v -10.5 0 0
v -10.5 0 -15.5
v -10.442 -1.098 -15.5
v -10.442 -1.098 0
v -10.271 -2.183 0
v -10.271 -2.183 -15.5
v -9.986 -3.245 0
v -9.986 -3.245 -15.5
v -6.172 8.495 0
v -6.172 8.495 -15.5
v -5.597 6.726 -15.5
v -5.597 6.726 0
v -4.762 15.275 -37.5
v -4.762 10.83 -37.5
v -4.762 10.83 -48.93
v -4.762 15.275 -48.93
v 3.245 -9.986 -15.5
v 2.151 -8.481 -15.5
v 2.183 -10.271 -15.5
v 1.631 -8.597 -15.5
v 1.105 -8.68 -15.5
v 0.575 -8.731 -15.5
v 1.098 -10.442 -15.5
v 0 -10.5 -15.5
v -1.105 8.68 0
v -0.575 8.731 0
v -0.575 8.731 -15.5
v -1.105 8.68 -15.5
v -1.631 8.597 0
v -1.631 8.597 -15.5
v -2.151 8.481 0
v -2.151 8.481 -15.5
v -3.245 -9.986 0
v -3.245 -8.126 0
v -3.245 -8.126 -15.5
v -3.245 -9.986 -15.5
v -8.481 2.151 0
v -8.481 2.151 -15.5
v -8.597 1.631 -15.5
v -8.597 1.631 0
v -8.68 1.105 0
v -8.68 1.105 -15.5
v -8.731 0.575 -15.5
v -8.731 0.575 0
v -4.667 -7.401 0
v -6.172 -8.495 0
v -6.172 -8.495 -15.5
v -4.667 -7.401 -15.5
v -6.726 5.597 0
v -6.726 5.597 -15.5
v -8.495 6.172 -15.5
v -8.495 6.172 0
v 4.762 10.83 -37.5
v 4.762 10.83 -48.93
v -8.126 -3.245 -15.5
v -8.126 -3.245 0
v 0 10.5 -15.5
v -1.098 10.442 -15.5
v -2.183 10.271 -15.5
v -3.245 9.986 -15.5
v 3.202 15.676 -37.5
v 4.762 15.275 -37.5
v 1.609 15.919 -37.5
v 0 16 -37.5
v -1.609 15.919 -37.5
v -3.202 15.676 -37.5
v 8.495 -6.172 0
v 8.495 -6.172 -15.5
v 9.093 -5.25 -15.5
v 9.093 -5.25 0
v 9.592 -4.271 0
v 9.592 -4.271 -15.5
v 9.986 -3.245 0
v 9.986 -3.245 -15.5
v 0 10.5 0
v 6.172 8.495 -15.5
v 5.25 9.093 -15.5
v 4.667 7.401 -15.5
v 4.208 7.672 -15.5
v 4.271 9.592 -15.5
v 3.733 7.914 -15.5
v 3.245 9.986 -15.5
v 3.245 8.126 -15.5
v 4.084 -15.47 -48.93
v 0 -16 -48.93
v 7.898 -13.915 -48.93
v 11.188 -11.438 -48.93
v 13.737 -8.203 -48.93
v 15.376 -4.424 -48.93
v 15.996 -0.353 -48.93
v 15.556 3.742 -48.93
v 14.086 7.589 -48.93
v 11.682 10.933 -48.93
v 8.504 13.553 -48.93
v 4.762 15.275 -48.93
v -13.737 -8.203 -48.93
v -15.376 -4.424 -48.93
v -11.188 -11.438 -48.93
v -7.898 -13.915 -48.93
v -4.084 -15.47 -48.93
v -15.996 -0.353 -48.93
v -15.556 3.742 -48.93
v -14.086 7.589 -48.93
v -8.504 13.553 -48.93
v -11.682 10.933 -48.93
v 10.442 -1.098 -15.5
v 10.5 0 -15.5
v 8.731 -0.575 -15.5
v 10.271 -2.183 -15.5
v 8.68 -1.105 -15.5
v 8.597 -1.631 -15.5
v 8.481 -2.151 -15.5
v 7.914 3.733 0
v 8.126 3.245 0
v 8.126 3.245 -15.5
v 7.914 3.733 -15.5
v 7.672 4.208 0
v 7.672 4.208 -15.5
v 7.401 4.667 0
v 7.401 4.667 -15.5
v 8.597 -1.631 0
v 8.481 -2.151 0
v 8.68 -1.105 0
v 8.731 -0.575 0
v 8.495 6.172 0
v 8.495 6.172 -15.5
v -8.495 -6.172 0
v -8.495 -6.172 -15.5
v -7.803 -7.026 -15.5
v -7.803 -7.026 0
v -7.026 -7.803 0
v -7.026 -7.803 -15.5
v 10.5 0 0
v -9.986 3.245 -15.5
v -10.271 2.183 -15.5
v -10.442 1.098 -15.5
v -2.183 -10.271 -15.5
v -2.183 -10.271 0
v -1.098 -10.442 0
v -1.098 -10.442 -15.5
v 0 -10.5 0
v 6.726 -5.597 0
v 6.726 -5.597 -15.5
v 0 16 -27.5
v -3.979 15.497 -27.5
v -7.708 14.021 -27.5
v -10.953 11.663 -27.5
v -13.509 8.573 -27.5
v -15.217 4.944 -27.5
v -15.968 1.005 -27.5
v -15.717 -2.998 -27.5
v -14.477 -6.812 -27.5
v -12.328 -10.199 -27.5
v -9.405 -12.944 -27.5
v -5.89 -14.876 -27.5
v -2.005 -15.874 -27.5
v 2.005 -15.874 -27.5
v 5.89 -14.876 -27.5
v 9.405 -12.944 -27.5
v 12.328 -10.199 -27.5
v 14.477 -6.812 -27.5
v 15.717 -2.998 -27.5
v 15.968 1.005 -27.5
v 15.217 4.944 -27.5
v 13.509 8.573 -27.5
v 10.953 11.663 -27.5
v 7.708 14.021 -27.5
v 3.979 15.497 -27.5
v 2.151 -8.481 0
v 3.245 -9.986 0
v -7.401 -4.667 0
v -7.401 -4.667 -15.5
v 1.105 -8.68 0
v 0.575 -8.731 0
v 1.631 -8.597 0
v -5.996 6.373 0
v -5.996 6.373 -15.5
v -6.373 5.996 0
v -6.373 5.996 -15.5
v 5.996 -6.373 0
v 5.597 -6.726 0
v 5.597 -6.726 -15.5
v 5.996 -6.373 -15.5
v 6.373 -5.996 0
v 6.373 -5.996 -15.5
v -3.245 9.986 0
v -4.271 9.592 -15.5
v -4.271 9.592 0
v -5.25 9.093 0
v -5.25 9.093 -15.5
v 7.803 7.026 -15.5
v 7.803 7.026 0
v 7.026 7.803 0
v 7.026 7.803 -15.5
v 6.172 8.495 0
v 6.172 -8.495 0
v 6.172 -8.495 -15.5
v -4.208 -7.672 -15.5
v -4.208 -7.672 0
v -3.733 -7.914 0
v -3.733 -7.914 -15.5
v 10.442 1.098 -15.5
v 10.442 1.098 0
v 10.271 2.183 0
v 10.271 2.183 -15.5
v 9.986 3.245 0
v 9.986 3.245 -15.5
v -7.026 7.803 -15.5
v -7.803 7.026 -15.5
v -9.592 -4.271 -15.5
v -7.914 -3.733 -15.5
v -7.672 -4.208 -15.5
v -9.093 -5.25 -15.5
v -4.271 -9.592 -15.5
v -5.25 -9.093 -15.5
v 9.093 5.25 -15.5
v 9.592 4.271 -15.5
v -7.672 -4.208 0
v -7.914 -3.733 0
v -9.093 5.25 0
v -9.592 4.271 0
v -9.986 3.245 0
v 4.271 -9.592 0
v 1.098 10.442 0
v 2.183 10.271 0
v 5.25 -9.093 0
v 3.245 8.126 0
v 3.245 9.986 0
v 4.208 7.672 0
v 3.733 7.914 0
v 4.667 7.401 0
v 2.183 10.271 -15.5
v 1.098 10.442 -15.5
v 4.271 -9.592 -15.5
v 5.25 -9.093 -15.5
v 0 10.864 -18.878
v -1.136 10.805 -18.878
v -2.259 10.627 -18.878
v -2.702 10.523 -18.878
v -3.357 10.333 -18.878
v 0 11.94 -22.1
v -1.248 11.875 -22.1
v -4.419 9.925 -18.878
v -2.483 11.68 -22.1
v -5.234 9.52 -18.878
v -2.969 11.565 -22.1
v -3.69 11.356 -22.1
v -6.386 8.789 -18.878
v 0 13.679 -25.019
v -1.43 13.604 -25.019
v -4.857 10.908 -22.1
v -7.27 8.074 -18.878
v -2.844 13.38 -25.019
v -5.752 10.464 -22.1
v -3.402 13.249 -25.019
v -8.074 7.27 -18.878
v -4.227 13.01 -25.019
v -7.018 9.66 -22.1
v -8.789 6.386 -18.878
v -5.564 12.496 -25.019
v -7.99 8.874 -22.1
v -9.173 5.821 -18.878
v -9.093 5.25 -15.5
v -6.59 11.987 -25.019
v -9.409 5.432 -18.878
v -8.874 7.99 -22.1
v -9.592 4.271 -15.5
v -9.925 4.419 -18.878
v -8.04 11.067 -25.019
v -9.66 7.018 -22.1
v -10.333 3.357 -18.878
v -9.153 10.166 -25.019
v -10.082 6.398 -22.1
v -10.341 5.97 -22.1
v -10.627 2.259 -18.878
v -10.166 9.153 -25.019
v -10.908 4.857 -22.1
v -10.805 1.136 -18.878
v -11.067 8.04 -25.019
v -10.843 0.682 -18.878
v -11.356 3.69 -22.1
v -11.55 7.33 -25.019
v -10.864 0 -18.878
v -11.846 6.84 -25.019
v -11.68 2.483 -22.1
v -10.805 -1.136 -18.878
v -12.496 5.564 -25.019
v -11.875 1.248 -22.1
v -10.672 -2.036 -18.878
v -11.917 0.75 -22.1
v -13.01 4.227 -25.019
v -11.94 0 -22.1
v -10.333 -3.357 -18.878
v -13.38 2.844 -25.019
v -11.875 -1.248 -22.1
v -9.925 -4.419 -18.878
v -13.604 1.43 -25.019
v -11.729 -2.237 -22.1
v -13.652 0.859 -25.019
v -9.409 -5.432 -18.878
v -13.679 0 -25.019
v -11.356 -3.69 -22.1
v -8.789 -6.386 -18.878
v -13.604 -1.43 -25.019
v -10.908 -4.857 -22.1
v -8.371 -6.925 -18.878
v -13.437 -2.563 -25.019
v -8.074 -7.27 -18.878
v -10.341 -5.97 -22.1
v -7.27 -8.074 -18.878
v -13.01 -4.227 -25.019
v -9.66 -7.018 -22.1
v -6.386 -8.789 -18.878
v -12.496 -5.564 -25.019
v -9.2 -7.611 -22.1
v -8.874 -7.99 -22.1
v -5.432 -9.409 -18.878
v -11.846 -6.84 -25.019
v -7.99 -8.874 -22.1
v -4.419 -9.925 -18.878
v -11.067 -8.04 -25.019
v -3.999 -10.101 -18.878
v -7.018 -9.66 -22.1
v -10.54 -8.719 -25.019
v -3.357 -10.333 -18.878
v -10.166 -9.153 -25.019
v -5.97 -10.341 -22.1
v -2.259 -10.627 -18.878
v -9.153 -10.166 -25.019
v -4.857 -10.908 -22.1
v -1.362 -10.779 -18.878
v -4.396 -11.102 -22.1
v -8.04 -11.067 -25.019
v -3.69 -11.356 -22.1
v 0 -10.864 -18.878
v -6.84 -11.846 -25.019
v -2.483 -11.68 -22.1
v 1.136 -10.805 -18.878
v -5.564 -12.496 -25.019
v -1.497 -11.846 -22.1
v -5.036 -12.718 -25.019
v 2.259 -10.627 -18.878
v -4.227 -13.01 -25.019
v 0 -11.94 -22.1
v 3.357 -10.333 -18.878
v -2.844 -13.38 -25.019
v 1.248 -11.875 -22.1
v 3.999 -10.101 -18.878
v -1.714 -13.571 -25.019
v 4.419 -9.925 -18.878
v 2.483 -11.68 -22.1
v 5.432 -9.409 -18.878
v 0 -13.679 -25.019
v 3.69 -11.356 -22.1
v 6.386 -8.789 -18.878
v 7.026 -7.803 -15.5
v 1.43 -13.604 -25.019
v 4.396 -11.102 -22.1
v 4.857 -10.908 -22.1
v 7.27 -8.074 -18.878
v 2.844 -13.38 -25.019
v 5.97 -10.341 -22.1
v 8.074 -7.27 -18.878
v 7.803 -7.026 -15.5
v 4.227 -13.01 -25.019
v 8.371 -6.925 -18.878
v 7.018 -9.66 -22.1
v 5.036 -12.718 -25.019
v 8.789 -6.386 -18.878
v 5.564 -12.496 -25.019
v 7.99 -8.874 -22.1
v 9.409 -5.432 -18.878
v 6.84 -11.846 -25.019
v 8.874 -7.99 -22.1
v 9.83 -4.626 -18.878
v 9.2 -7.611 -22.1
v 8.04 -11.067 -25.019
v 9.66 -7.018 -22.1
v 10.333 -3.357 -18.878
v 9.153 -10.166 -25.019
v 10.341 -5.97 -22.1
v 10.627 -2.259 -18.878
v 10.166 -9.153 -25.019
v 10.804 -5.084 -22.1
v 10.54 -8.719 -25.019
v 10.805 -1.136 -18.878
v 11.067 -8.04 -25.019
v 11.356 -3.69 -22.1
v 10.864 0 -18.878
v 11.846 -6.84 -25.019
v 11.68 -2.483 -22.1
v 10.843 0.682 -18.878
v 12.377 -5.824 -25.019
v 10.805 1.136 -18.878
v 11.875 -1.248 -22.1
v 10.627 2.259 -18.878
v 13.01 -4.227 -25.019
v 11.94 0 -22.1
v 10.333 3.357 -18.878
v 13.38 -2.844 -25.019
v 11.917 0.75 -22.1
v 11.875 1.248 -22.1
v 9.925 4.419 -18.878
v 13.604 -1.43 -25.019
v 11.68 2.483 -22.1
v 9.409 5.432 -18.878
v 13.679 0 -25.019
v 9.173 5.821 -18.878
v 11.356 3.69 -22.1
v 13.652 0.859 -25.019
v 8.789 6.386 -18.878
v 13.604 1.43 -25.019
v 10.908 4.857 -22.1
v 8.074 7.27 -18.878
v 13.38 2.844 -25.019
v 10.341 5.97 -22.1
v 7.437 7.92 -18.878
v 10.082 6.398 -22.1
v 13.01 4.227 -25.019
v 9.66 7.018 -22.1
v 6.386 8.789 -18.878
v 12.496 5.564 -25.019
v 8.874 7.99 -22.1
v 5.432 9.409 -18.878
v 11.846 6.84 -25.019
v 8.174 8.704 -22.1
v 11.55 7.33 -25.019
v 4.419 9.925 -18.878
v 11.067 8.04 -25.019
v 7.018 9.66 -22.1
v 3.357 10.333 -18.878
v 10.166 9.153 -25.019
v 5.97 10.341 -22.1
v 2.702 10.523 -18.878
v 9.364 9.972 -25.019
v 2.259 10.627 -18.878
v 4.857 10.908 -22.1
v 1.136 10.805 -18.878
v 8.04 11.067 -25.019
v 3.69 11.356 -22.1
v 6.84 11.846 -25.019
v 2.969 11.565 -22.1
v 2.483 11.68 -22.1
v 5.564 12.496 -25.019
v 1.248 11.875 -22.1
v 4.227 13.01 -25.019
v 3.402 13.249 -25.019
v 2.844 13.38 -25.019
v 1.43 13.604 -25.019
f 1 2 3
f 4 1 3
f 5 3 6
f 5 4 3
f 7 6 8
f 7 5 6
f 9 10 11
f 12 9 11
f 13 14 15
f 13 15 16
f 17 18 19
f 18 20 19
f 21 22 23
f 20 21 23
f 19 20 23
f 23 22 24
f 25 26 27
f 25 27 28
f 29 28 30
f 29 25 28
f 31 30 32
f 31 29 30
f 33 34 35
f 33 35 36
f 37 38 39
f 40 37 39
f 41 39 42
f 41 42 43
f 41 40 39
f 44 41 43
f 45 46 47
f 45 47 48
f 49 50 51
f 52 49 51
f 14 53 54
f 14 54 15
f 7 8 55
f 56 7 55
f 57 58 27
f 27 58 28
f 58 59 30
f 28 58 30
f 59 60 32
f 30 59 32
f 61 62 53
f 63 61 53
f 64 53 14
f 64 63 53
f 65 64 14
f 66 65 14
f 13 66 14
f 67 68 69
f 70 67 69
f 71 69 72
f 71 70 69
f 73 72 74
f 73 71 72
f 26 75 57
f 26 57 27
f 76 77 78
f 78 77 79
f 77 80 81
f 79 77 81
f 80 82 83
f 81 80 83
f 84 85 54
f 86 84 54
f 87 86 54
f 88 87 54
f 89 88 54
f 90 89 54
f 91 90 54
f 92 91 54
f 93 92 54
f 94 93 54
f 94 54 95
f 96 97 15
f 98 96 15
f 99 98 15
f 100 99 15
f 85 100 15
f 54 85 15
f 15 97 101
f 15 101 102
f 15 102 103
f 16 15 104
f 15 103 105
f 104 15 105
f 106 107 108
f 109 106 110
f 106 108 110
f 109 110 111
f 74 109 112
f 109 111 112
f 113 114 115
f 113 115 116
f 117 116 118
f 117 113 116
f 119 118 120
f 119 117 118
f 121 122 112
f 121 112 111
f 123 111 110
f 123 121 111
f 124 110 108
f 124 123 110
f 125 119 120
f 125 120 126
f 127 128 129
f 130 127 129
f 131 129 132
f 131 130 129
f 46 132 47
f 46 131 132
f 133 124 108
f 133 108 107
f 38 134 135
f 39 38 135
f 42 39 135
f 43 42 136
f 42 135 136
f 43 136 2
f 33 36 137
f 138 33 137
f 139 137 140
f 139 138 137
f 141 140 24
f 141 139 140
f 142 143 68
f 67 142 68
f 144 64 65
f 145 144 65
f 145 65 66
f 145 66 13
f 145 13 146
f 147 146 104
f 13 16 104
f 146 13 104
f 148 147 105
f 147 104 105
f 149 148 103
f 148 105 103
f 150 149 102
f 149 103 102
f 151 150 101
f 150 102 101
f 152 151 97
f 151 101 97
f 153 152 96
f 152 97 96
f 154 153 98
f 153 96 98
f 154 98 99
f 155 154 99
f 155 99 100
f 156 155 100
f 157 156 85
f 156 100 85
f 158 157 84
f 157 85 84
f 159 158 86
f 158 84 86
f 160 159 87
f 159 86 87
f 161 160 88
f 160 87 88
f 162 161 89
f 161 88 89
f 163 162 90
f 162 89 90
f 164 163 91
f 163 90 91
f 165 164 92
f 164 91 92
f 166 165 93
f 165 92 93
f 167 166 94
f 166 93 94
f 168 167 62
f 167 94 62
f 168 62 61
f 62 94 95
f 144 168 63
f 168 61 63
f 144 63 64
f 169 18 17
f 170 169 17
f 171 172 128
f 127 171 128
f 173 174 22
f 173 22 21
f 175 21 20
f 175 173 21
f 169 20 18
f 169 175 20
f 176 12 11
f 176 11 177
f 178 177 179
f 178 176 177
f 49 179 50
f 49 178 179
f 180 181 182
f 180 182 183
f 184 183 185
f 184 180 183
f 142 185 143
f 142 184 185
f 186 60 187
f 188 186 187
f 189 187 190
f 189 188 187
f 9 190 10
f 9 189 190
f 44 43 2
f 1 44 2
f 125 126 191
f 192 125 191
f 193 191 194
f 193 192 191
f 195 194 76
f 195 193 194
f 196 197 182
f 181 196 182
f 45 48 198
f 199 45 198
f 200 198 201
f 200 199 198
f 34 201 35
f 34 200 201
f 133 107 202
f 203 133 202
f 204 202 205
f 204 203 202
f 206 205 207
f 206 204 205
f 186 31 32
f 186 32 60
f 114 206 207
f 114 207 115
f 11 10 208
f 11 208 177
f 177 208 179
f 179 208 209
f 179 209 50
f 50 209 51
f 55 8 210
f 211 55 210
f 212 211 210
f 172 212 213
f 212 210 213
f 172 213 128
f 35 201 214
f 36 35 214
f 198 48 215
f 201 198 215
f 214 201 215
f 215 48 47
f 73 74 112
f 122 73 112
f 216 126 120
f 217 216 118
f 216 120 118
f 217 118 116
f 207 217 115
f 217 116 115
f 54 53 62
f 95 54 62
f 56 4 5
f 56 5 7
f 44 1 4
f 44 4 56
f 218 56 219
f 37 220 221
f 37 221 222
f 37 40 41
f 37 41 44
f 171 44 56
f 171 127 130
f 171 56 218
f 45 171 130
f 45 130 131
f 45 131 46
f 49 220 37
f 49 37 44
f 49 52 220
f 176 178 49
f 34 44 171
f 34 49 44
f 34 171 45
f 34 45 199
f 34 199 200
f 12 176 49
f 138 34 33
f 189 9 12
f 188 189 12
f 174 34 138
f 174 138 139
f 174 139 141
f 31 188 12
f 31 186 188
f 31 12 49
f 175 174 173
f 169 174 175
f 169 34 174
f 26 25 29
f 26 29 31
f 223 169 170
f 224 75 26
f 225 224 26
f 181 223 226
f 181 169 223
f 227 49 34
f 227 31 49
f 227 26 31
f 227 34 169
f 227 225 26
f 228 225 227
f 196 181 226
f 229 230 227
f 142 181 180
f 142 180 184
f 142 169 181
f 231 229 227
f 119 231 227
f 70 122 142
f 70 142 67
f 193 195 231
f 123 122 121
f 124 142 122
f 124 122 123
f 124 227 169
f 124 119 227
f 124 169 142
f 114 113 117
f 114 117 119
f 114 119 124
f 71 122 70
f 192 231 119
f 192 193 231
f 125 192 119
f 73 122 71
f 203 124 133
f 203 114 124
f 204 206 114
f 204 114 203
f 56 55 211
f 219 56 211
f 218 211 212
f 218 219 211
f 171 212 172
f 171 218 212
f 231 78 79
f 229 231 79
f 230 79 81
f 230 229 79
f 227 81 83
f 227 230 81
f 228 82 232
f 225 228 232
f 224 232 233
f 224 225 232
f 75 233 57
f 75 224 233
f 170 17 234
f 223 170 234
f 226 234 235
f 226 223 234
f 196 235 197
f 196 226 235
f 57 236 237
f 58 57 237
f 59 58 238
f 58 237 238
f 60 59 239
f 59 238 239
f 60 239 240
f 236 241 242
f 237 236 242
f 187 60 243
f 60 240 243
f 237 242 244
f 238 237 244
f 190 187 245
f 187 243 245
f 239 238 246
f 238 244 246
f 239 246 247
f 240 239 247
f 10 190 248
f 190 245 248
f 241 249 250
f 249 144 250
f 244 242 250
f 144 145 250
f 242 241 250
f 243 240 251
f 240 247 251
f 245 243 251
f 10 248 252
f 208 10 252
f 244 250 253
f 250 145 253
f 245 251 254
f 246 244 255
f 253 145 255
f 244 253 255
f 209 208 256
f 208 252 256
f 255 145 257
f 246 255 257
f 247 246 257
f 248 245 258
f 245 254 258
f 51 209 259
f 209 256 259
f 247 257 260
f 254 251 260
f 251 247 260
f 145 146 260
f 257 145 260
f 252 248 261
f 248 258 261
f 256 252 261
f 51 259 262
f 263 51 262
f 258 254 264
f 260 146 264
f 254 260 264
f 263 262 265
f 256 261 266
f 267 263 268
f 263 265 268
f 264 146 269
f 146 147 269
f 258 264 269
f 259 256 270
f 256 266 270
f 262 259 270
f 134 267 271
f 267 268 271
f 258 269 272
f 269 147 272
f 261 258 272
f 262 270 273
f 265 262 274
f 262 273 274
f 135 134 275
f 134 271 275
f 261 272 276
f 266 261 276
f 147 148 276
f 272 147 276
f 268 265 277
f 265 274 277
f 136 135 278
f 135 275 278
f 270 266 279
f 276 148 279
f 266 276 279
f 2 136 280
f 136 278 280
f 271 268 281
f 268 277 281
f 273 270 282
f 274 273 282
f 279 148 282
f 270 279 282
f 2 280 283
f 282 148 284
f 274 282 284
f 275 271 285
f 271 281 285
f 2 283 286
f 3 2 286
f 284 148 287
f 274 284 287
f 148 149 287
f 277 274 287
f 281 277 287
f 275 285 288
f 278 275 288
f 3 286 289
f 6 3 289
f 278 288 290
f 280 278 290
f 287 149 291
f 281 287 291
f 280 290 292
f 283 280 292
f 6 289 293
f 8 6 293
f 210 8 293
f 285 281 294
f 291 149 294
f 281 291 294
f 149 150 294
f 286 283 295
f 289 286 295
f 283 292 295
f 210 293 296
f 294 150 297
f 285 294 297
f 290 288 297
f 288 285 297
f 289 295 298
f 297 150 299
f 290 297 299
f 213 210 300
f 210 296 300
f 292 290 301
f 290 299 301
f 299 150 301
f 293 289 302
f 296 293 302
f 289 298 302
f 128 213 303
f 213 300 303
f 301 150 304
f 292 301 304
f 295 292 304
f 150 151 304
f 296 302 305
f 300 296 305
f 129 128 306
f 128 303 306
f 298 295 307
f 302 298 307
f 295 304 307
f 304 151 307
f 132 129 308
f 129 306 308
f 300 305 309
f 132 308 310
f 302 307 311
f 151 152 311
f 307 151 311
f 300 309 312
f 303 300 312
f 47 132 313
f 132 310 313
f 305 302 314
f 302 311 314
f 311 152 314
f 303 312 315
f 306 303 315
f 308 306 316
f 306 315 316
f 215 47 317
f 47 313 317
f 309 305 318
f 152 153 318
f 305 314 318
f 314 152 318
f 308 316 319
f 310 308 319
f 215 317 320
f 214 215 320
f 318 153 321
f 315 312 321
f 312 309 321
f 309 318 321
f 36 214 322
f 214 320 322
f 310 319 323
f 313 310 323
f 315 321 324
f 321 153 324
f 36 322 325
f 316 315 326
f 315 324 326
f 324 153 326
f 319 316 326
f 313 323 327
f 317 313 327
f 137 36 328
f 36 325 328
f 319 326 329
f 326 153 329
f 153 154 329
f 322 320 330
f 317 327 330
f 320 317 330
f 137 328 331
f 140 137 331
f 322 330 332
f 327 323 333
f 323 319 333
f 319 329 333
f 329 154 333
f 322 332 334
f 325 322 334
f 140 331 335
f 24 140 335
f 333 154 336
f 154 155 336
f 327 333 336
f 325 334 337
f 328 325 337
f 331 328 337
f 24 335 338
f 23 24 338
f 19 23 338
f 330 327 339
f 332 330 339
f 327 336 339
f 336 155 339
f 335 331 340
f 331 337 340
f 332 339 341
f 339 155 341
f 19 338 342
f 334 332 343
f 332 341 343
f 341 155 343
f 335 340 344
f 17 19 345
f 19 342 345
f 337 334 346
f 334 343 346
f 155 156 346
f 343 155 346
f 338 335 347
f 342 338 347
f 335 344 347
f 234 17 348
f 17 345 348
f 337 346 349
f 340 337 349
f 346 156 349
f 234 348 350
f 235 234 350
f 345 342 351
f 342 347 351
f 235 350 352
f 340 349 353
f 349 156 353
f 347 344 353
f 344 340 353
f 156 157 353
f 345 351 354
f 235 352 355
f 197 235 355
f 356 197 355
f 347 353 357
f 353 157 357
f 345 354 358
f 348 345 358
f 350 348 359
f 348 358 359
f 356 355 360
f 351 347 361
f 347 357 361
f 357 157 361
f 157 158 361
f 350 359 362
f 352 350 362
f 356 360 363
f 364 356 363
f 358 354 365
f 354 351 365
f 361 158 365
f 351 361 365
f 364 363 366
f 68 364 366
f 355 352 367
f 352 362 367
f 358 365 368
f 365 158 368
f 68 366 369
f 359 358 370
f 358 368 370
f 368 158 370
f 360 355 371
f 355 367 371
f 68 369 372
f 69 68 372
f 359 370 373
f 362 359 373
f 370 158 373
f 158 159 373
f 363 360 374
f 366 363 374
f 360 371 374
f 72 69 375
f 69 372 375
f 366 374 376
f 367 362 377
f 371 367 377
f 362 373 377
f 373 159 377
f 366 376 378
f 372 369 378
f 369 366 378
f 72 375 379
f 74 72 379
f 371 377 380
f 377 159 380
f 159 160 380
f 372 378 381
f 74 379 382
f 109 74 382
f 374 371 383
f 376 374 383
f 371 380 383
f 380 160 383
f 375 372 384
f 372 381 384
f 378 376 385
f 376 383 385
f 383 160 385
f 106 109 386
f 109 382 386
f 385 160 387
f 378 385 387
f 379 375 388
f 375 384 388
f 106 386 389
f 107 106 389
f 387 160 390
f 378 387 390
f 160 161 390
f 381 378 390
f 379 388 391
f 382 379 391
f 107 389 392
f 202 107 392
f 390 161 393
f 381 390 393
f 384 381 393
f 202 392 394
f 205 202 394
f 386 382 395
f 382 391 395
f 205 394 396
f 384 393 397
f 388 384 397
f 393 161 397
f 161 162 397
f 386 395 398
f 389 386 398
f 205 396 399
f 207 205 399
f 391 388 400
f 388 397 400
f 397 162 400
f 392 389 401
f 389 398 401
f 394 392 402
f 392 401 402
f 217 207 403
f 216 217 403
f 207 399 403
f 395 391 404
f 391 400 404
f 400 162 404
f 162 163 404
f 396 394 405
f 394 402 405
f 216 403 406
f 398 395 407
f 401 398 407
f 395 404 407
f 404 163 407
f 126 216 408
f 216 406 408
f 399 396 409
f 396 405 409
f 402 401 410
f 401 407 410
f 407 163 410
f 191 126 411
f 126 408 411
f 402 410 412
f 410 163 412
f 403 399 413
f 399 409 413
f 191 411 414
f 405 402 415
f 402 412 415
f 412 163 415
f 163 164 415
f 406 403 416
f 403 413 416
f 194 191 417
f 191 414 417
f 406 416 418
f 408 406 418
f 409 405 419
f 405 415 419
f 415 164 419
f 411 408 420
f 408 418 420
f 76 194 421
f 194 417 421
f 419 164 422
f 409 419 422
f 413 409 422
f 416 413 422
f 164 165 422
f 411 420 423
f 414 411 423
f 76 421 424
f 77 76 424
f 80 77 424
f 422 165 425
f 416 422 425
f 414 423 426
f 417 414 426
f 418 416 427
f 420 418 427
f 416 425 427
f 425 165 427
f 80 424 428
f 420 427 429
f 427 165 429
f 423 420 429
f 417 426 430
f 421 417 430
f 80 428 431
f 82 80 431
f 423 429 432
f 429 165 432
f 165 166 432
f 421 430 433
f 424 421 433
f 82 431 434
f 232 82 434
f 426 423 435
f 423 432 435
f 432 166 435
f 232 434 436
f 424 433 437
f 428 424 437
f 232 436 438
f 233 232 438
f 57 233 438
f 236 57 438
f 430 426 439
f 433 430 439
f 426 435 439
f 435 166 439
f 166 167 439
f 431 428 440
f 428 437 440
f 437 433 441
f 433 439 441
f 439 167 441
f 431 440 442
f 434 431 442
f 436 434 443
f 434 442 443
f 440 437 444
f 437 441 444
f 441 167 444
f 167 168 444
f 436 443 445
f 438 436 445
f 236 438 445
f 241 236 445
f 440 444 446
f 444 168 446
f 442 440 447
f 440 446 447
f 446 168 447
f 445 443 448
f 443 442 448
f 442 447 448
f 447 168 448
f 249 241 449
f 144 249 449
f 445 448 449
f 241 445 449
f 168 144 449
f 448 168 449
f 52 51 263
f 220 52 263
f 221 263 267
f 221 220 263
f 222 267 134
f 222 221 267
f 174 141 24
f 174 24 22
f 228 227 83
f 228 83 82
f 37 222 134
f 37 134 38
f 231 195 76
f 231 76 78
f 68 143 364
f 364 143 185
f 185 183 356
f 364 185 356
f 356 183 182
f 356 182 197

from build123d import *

# Parameters (mm, degrees)
BOSS_EXTRUDE1_DEPTH = 20
CIRPATTERN1_COUNT   = 10
CUT_EXTRUDE1_START  = -11.43
SKETCH3_W           = 9.525
SKETCH3_H           = 5.618681597
CUT_EXTRUDE1_DEPTH  = 11.43


with BuildPart() as part:
    # Sketch1 → Boss-Extrude1 (new body)
    with BuildSketch(Plane.XY):
        with BuildLine():
            Line((0, 10.5), (0, 0))
            Line((0, 0), (6.171745149, 8.494678441))
            Line((6.171745149, 8.494678441), (4.667031658, 7.401440097))
            ThreePointArc((4.667031658, 7.401440097), (3.972416873, 7.796307087), (3.244678441, 8.126165259))
            Line((3.244678441, 8.126165259), (3.244678441, 9.986093421))
            ThreePointArc((3.244678441, 9.986093421), (1.642561883, 10.370727576), (0, 10.5))
        make_face()
    boss_extrude1 = extrude(amount=-BOSS_EXTRUDE1_DEPTH)

    # CirPattern1: Boss-Extrude1 ×10 about axis
    cirpattern1_axis = Axis((0, 0, 0), (0, 0, 1))
    for i in range(1, CIRPATTERN1_COUNT):
        add(boss_extrude1.rotate(cirpattern1_axis, i * 360 / CIRPATTERN1_COUNT))

    # Sketch2 → Revolve1 (revolve)
    with BuildSketch(Plane(origin=(0, 0, 0), x_dir=(0, 0, -1), z_dir=(1, 0, 0))):
        with BuildLine():
            Line((2.355087252, 0), (2.355087252, 8.6))
            Line((2.355087252, 8.6), (15.5, 8.6))
            Line((15.5, 8.6), (15.5, 10.5))
            ThreePointArc((15.5, 10.5), (22.100189391, 11.940495874), (27.5, 16))
            Line((27.5, 16), (48.93, 16))
            Line((48.93, 16), (48.93, 0))
            Line((48.93, 0), (2.355087252, 0))
        make_face()
    revolve(axis=Axis((0, 0, -48.93), (0, 0, 1)))

    # Sketch3 → Cut-Extrude1 (cut)
    with BuildSketch(Plane(origin=(0, 0, -48.93), x_dir=(-1, 0, 0), z_dir=(0, 0, -1)).offset(CUT_EXTRUDE1_START)):
        with Locations((0, 13.639110642)):
            Rectangle(SKETCH3_W, SKETCH3_H)
    extrude(amount=CUT_EXTRUDE1_DEPTH, mode=Mode.SUBTRACT)


solid = part.part
